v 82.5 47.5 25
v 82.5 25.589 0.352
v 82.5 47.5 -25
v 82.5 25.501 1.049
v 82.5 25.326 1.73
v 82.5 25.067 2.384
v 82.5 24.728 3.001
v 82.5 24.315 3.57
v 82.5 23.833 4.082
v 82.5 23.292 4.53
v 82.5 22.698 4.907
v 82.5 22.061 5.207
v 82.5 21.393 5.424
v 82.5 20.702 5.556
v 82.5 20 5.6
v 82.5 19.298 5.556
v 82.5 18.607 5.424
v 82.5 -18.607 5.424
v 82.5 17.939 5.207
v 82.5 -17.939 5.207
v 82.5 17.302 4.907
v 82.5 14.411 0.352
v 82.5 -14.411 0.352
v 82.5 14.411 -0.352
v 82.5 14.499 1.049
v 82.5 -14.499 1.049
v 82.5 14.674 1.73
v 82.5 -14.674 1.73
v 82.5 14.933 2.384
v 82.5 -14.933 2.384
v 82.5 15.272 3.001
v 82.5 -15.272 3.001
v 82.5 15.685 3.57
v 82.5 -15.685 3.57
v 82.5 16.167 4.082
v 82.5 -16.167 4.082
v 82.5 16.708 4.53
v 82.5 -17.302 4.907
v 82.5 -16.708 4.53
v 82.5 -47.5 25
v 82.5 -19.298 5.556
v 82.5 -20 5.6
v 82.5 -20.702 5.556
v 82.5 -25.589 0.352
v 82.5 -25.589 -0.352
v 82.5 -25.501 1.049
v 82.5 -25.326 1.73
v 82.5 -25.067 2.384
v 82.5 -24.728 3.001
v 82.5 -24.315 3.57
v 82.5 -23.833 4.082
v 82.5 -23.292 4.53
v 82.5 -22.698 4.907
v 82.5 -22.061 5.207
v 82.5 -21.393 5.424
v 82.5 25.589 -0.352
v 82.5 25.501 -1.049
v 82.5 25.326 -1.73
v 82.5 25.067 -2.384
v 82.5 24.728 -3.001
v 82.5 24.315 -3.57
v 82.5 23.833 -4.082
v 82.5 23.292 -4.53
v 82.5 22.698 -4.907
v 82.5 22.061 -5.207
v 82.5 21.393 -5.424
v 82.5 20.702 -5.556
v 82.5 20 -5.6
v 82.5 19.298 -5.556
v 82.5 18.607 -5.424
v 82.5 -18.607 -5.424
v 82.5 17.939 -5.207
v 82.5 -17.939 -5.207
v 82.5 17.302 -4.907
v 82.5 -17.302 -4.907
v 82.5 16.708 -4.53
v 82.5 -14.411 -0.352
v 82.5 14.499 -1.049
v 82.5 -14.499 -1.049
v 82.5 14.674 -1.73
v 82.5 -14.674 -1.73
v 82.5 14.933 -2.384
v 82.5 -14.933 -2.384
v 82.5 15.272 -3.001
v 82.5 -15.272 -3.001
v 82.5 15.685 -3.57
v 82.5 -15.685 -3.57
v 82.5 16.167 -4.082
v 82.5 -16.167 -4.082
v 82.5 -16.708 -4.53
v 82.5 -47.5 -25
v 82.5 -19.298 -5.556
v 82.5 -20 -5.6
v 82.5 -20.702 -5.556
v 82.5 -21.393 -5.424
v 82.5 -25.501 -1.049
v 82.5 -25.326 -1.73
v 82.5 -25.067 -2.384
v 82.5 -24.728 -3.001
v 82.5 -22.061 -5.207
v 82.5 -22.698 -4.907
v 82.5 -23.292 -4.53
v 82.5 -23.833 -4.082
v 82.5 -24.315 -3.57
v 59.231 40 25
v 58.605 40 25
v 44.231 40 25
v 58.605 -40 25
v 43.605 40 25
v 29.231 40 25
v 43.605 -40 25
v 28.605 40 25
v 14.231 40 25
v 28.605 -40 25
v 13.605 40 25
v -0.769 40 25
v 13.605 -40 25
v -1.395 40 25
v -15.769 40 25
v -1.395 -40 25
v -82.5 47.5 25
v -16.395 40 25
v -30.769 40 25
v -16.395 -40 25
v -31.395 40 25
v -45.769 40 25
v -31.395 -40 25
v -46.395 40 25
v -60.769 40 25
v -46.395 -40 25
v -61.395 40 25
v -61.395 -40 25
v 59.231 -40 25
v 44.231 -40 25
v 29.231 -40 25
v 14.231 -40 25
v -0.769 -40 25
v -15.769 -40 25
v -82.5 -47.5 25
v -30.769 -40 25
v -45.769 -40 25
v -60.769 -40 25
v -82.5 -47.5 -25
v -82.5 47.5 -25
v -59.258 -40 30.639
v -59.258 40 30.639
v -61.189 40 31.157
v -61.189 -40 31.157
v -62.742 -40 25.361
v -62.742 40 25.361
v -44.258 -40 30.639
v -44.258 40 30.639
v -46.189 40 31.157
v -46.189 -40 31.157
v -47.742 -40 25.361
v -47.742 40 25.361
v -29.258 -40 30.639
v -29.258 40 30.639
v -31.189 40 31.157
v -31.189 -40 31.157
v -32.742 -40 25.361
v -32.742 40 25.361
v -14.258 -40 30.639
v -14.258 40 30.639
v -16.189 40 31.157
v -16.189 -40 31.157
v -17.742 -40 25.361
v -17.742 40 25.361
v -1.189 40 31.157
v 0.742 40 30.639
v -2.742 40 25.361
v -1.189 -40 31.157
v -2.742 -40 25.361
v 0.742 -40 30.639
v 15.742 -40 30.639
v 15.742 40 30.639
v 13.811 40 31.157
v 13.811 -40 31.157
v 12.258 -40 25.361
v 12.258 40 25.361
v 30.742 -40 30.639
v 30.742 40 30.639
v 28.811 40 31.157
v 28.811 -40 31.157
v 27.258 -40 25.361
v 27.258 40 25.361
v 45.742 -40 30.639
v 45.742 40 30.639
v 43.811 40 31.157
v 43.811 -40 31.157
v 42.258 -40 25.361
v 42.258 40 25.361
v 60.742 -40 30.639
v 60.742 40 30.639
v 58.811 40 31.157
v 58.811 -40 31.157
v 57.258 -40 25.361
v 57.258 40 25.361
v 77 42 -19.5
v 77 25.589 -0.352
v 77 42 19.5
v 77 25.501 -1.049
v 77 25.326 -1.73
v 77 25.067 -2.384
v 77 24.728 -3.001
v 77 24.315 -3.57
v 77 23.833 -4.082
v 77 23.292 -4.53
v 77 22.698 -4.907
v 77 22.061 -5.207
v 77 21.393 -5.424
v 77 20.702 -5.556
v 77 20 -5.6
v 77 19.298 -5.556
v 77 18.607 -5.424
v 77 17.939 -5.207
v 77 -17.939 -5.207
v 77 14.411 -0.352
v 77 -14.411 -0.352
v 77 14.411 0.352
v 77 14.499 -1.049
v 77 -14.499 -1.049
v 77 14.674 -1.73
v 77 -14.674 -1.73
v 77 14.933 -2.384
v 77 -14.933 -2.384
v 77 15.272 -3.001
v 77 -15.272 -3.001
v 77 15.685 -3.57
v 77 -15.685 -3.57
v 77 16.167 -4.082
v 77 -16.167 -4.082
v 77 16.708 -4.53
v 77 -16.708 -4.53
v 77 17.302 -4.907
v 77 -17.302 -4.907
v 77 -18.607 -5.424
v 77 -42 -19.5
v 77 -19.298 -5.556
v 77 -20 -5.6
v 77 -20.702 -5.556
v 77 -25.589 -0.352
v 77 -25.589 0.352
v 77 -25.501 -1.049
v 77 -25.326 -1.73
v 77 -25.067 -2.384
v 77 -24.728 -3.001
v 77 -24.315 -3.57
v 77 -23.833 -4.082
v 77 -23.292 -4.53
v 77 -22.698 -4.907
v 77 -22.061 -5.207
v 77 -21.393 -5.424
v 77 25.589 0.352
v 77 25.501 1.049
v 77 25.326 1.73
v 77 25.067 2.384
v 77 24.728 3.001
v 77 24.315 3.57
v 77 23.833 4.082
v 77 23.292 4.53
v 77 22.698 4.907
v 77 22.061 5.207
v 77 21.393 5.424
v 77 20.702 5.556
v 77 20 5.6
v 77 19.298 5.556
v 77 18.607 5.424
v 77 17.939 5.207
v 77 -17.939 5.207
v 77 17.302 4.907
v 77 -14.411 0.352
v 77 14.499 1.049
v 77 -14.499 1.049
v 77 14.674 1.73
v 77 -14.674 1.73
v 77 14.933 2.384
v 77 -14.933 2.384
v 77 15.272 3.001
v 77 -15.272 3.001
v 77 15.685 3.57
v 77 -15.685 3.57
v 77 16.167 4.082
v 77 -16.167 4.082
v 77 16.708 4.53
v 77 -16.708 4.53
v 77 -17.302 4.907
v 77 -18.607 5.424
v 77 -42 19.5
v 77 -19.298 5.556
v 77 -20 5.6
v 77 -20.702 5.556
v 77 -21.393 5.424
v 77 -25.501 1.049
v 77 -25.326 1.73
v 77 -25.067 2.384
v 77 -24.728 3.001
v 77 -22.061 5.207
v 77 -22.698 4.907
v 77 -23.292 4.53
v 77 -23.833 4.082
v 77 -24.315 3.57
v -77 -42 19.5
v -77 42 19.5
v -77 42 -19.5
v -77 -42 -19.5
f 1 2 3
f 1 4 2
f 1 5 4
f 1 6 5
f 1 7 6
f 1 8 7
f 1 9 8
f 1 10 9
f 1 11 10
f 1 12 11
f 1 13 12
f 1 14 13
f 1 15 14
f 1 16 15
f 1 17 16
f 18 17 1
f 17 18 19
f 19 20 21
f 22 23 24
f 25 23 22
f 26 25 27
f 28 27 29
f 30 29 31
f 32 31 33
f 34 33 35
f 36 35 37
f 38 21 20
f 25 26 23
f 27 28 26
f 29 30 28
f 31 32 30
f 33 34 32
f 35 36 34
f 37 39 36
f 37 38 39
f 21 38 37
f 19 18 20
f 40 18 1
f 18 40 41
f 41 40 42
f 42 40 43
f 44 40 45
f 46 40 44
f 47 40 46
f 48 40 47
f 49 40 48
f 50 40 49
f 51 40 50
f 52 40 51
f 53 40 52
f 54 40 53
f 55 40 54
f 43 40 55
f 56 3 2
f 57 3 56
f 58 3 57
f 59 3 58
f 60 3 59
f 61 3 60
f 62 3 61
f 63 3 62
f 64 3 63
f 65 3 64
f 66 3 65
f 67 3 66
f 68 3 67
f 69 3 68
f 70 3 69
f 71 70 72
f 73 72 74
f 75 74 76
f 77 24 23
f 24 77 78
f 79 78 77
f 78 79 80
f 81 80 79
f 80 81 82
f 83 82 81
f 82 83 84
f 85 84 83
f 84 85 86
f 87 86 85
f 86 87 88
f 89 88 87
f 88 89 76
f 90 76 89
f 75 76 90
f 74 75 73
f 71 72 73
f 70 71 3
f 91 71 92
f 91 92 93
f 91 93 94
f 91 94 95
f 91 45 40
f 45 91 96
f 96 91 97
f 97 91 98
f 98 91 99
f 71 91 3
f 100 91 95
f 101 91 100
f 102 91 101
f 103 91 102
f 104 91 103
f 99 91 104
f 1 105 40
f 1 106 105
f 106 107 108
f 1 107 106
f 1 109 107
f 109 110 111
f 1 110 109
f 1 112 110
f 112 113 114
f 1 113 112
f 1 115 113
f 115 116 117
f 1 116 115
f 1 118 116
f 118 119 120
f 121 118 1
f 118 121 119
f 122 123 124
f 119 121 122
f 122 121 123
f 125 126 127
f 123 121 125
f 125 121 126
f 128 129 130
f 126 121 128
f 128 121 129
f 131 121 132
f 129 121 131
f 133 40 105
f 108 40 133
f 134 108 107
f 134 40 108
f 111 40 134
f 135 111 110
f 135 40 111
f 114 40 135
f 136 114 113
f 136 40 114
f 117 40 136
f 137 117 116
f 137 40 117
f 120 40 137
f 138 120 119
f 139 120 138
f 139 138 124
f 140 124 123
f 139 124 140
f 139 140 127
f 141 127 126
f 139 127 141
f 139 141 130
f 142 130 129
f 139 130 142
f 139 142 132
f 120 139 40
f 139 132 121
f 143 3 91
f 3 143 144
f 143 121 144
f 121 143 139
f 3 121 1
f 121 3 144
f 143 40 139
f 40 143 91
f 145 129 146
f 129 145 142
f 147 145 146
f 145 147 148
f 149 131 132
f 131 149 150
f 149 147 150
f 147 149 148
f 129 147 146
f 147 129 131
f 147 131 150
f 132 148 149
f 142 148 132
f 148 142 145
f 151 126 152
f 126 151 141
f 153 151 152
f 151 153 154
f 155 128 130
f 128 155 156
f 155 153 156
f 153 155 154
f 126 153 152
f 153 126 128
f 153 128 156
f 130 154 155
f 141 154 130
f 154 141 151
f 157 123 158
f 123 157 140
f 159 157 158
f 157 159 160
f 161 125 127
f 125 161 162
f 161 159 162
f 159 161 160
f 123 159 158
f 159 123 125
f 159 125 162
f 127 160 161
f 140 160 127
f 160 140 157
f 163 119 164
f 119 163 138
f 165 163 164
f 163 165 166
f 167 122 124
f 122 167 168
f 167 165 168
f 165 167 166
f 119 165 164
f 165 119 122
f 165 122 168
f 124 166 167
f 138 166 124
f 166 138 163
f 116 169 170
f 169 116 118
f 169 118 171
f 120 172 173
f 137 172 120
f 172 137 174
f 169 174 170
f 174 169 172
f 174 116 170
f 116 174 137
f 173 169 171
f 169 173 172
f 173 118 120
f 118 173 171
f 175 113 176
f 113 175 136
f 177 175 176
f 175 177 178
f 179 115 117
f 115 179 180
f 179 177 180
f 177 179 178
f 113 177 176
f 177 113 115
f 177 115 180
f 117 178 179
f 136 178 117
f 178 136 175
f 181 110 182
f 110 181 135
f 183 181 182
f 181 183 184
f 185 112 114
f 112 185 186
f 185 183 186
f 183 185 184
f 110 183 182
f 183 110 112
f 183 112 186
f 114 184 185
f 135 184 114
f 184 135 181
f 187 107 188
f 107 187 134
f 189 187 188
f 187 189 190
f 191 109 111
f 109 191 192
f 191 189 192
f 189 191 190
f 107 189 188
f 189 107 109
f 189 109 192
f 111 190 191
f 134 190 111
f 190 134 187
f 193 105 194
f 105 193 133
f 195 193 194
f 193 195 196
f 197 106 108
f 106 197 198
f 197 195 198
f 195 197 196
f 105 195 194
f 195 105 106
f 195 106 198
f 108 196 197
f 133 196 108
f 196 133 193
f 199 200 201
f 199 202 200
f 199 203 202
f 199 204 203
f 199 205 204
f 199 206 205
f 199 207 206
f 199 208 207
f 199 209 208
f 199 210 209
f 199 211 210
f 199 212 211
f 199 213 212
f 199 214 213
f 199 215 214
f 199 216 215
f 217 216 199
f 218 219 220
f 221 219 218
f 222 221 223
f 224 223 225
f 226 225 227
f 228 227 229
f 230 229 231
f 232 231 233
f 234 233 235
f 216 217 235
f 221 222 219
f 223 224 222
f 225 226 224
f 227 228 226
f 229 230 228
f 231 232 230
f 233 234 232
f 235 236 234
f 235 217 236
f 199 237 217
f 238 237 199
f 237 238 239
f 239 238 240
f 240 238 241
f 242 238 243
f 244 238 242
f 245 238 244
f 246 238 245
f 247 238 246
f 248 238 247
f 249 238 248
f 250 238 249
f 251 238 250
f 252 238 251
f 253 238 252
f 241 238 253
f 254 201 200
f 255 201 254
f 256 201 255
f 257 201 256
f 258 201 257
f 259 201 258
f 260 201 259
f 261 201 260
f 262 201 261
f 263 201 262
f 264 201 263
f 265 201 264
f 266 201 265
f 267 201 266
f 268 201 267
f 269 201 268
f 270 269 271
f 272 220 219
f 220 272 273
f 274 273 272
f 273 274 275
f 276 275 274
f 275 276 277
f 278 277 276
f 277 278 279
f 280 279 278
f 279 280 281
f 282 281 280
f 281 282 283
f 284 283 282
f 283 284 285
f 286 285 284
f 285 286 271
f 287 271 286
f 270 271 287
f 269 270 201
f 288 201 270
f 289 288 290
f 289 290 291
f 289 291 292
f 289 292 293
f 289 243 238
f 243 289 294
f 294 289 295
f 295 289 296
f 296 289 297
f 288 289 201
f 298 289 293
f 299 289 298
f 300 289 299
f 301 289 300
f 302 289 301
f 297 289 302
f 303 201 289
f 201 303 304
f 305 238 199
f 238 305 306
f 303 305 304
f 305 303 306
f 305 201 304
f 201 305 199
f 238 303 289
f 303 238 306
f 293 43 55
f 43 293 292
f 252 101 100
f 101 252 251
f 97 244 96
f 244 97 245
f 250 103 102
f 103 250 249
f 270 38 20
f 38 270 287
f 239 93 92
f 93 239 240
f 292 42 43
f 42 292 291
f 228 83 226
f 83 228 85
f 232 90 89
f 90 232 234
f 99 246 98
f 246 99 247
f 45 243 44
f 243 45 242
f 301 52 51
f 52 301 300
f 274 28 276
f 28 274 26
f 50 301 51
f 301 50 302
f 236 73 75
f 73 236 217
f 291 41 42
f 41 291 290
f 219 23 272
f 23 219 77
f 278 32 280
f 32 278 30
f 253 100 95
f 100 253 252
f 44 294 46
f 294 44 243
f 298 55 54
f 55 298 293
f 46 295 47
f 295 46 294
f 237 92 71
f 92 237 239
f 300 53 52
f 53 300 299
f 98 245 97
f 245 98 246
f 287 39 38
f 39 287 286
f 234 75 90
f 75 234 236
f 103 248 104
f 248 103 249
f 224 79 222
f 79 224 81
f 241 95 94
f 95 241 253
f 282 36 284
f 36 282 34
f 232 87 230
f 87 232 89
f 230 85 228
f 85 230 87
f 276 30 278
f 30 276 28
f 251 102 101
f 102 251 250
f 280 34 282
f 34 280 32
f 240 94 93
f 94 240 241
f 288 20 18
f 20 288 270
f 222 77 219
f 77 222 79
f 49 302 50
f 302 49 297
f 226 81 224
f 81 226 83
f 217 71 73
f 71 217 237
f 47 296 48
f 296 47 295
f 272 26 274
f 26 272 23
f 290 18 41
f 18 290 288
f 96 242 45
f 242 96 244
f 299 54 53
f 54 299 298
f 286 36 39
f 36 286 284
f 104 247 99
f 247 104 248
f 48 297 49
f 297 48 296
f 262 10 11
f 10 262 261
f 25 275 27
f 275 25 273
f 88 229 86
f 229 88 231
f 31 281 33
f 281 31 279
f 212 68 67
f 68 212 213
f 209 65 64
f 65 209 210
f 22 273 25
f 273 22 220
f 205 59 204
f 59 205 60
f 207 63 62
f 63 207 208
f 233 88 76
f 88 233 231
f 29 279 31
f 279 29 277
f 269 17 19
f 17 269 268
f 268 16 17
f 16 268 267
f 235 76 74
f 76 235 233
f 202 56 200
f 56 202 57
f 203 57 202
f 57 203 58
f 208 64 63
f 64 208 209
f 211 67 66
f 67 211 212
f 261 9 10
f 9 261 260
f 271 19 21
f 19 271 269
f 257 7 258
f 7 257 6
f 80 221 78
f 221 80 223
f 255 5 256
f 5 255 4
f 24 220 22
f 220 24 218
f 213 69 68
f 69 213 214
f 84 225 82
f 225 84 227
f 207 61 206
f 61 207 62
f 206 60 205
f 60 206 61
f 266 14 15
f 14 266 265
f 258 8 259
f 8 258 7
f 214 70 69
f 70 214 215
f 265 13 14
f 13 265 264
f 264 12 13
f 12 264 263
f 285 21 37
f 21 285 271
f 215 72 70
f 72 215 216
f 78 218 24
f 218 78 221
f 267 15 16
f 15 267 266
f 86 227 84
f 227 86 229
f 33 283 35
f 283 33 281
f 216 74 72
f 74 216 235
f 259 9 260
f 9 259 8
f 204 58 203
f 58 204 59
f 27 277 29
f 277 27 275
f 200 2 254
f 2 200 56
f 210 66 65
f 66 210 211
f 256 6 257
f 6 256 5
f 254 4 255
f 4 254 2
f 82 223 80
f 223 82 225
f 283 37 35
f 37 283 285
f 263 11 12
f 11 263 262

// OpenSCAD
// ========================================================
// F-14F RETROFIT KIT - STEALTH TACTICAL SATELLITE MODULE
// LOW-OBSERVABLE COCKPIT TRANSCEIVER INTEGRATION v2
// ========================================================

$fn = 50; // Precision edge smoothing for geometric scattering paths

// --- STEALTH MODULAR CONSTANTS (mm) ---
sat_length = 162; // Slightly widened to account for the RAM absorption jacket
sat_width  = 92;  
sat_height = 47;  
wall_thick = 4.0; 
ram_depth  = 1.5;  // Thickness of the integrated radar-absorbent material matrix

// --- COLOR PALETTE ---
ram_stealth_matte = [0.10, 0.10, 0.11, 1.0]; // Non-reflective Carbon-CNT RAM finish
fss_gold_tint     = [0.85, 0.65, 0.15, 0.45]; // Frequency-Selective Surface copper matrix
coax_dark_chrome  = [0.30, 0.32, 0.35, 1.0]; // Low-RCS treated antenna connectors

// ========================================================
// REINFORCED COMPONENT ASSEMBLY GENERATION
// ========================================================

module stealth_satcom_assembly() {
    difference() {
        union() {
            // 1. Core Structural Chassis Body (Aluminum-Billet Base)
            color([0.2, 0.2, 0.2]) cube([sat_length, sat_width, sat_height], center=true);
            
            // 2. INTEGRATED STEALTH RETROFIT: Multi-Layer RAM Absorption Jacket
            // Traps incoming radar signals and converts them to low-grade heat
            color(ram_stealth_matte)
                difference() {
                    cube([sat_length + (ram_depth*2), sat_width + (ram_depth*2), sat_height + (ram_depth*2)], center=true);
                    cube([sat_length - 0.2, sat_width - 0.2, sat_height - 0.2], center=true);
                }
                
            // Low-Profile Angled Thermal Scattering Fins (Scatters radar at odd vectors)
            color(ram_stealth_matte) {
                for (x_fin = [-sat_length/2 + 20 : 15 : sat_length/2 - 20]) {
                    translate([x_fin, 0, sat_height/2 + ram_depth + 3])
                        rotate([0, 15, 0]) // 15-degree radar scattering slant deflection
                        cube([2.0, sat_width - 12, 6], center=true);
                }
            }
        }
        
        // Internal hollow component safety containment cavity subtraction
        cube([sat_length - (wall_thick*2), sat_width - (wall_thick*2), sat_height - (wall_thick*2)], center=true);
        
        // Front wall ports for low-RCS treated antenna connectors
        translate([sat_length/2 + 3, -20, 0]) rotate([0, 90, 0]) cylinder(d=11.2, h=20, center=true);
        translate([sat_length/2 + 3,  20, 0]) rotate([0, 90, 0]) cylinder(d=11.2, h=20, center=true);
    }
    
    // 3. Embedded Frequency-Selective Surface (FSS) Window Dome
    // Electromagnetically opaque to X-band, but perfectly open to L-band satellite frequencies
    color(fss_gold_tint)
        translate([0, 0, -sat_height/4])
        %cube([sat_length - 15, sat_width - 15, 2], center=true);
}

// Execute active structural rendering view
stealth_satcom_assembly();
